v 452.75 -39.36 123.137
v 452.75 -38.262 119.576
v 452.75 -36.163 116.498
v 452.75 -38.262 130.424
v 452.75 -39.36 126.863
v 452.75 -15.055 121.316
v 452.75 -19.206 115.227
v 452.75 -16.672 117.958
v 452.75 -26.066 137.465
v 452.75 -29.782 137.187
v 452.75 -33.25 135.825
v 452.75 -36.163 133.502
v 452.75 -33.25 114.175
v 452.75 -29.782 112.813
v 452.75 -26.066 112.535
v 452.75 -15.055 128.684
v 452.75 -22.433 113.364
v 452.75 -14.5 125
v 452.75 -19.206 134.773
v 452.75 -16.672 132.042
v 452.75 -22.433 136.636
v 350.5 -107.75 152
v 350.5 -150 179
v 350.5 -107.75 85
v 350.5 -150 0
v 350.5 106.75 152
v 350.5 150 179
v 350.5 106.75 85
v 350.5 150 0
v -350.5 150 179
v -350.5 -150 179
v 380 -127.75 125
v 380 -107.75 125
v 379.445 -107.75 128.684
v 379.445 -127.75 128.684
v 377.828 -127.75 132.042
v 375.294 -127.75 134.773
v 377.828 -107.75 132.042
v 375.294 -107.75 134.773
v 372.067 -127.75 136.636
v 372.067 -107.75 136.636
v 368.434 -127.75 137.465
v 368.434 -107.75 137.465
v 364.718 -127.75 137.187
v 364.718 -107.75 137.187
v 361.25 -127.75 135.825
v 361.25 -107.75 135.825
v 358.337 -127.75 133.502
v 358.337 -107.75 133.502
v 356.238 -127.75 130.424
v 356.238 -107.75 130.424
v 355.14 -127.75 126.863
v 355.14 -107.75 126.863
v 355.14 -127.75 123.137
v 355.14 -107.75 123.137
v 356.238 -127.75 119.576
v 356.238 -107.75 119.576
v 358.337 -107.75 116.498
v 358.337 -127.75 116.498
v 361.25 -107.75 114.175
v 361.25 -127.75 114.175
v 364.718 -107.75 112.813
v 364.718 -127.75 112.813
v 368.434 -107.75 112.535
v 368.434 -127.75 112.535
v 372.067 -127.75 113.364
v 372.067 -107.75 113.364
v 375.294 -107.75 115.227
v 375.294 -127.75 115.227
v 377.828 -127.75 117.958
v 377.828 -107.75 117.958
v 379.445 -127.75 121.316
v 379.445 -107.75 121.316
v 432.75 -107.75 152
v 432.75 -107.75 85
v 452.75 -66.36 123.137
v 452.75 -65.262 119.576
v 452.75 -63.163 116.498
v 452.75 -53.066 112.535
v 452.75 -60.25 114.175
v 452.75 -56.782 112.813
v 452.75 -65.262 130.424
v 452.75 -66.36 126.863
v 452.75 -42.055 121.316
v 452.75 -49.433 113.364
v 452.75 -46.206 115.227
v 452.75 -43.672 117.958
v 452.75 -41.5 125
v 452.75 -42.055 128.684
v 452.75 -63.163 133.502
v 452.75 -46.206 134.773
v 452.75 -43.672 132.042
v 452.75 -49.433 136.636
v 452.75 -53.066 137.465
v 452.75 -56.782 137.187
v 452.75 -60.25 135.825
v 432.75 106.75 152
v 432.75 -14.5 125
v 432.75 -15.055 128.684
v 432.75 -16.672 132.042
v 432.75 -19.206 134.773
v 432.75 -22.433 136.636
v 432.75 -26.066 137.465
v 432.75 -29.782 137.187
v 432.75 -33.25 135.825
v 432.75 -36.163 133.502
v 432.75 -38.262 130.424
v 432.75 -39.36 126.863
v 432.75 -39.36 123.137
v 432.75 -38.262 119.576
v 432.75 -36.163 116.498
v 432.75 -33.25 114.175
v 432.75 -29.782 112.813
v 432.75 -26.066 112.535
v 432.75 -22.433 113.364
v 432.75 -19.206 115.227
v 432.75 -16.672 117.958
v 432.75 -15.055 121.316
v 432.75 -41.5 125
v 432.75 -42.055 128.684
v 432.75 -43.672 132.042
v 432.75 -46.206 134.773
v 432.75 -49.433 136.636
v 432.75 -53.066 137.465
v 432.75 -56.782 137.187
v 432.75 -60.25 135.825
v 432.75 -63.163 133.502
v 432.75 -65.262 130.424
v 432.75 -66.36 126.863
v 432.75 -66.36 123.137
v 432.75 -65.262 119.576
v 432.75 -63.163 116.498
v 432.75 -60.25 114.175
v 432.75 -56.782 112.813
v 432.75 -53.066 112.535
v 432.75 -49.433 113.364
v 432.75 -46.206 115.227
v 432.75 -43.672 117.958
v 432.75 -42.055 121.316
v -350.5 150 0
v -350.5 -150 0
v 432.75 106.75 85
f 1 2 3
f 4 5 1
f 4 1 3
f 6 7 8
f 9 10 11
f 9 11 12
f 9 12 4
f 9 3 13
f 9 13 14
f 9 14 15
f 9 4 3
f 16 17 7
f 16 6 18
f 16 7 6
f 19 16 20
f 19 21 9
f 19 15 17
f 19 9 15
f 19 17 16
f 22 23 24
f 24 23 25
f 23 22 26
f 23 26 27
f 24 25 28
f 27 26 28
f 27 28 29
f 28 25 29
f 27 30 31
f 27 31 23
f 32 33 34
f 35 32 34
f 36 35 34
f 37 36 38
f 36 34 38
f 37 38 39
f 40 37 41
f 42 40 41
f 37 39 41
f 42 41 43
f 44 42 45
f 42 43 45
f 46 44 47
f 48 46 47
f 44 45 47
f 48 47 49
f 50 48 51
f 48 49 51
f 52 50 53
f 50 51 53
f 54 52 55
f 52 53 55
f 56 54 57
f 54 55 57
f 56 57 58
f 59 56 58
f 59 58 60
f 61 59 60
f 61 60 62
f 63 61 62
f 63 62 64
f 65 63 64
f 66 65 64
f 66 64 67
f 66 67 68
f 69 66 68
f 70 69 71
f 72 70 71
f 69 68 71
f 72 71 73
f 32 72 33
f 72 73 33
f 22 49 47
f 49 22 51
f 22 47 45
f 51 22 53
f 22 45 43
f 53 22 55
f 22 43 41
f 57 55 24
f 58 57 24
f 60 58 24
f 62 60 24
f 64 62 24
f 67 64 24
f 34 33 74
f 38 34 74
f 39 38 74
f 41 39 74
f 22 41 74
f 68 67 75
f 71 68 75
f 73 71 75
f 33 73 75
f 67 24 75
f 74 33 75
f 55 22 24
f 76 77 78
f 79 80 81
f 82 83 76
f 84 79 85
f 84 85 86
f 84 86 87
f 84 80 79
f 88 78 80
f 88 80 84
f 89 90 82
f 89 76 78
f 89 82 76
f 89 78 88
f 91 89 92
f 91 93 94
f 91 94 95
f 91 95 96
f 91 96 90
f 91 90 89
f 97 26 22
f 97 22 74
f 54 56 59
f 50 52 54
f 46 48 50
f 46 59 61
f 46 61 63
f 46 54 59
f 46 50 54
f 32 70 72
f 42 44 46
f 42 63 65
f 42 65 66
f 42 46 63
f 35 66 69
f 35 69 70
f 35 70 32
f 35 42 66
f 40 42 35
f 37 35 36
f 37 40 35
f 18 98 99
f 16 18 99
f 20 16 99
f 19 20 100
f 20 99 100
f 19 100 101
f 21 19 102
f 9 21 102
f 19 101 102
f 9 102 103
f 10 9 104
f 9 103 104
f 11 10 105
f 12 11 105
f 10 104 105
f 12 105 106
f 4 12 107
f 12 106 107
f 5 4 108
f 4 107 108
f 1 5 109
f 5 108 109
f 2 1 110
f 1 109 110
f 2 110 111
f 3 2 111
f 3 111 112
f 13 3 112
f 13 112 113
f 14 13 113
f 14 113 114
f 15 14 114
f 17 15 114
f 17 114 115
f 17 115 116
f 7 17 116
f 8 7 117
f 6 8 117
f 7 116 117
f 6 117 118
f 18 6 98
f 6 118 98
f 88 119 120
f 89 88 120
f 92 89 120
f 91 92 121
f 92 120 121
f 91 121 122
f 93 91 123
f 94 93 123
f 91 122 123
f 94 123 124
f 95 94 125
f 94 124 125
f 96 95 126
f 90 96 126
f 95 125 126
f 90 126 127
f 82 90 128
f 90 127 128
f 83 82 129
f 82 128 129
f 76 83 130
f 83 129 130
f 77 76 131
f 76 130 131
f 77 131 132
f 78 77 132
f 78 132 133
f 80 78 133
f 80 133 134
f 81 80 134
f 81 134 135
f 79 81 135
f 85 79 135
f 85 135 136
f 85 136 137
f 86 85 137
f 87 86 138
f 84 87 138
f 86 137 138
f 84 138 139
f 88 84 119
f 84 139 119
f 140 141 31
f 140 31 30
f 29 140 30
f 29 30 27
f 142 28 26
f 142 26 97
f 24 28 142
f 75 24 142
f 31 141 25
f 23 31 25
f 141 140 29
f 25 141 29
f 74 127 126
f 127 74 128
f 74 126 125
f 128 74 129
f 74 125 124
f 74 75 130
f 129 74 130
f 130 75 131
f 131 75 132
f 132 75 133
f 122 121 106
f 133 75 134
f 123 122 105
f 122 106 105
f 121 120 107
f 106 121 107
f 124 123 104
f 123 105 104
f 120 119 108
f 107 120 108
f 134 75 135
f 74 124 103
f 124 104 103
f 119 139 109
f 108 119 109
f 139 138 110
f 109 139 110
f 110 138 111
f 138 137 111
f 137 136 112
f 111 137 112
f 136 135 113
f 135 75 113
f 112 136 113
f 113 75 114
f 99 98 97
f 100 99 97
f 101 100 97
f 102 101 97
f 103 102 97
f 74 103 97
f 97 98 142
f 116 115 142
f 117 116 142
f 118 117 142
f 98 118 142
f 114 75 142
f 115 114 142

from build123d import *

# Parameters (mm, degrees)
SKETCH_W     = 701
SKETCH_H     = 300
PAD_DEPTH    = 179
SKETCH001_W  = 82.25
SKETCH001_H  = 214.5
PAD001_DEPTH = 67
SKETCH002_R  = 12.5
PAD002_DEPTH = 20
SKETCH003_R  = 12.5
PAD003_DEPTH = 20


with BuildPart() as part:
    # Sketch → Pad (new body)
    with BuildSketch(Plane.XY):
        Rectangle(SKETCH_W, SKETCH_H)
    extrude(amount=PAD_DEPTH)

    # Sketch001 → Pad001 (join)
    with BuildSketch(Plane.XY.offset(85)):
        with Locations((391.625, -0.5)):
            Rectangle(SKETCH001_W, SKETCH001_H)
    extrude(amount=PAD001_DEPTH)

    # Sketch002 → Pad002 (join)
    with BuildSketch(Plane.YZ.offset(432.75)):
        with Locations((-54, 125)):
            Circle(SKETCH002_R)
        with Locations((-27, 125)):
            Circle(SKETCH002_R)
    extrude(amount=PAD002_DEPTH)

    # Sketch003 → Pad003 (join)
    with BuildSketch(Plane.XZ.offset(107.75)):
        with Locations((367.5, 125)):
            Circle(SKETCH003_R)
    extrude(amount=PAD003_DEPTH)


solid = part.part
